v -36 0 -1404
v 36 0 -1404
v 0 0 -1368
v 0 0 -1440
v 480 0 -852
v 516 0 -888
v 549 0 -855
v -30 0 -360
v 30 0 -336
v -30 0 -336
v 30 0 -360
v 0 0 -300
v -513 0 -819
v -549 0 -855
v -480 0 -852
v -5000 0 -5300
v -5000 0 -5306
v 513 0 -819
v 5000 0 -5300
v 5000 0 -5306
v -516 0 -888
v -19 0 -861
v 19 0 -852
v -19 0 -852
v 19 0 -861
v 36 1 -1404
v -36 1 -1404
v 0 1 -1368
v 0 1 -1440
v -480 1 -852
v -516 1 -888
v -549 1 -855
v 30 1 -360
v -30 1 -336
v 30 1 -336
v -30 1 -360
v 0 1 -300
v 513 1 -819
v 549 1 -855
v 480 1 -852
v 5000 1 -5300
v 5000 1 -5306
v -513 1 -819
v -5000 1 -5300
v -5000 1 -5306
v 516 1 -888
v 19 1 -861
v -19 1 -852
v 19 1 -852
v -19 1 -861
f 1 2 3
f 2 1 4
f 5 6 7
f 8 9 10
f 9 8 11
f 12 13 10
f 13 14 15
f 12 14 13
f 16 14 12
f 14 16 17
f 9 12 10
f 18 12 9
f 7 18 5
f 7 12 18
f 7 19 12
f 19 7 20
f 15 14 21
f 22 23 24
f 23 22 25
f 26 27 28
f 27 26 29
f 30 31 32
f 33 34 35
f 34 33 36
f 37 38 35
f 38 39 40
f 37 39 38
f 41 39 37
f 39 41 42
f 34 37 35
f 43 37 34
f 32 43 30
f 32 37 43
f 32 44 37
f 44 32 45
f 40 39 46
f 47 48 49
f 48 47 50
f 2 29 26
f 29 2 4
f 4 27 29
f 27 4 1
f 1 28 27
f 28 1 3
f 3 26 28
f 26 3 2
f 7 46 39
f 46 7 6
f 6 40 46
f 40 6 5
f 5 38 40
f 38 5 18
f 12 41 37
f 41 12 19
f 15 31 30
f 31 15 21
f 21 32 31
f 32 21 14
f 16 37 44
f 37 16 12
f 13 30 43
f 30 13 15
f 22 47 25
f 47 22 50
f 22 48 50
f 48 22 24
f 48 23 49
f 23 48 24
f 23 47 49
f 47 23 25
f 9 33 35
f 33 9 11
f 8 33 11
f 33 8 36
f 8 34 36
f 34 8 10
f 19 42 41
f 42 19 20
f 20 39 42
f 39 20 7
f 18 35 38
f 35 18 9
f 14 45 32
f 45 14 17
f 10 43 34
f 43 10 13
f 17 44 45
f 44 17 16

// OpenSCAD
$fs = 120;

$vpt = [0,1080,480];
$vpr = [-34,0,0];
$vpf = 45;

foul_line = 6;
plain_color = [1,1,1,0.8];
out_color = [1,0.75,0.75,0.8];
eat_color = [0.5,0.75,1,0.8];

// home, first, second, third, rubber
color([1,1,1]) scale([1,-1,-1]) rotate([90,0,0]) linear_extrude(1) {
    polygon([[-30,30*2+300],[30,30*2+300],[30,30+300],[0,300],[-30,30+300]]);
    polygon([[552-36*2,852],[552-36,852+36],[552,852],[552-36,852-36]]);
    polygon([[0,1404+36],[36,1404],[0,1404-36],[-36,1404]]);
    polygon([[-552+36*2,852],[-552+36,852+36],[-552,852],[-552+36,852-36]]);
    polygon([[-19,852],[19,852],[19,9+852],[-19,9+852]]);
}

// foul lines
color([1,1,1,0.5]) scale([1,-1,-1]) rotate([90,0,0]) linear_extrude(1) {
    polygon([[0,300],[-5000,300+5000],[-5000,300+5000+foul_line],[0,300+foul_line]]);
    polygon([[0,300],[5000,300+5000],[5000,300+5000+foul_line],[0,300+foul_line]]);
}

scale([0.1,0.1,-0.1]) translate([-23200,0,0]) {
    color(out_color) polyhedron([[9680,0,11550],[14460,0,5630],[9680,3350,11550],[14460,3350,5630]], [[0,1,3,2]]);
    color(out_color) polyhedron([[9680,0,11550],[12300,0,13130],[9680,3350,11550],[12300,3350,13130]], [[0,1,3,2]]);
    color(out_color) polyhedron([[14460,0,5630],[16080,0,7210],[14460,3350,5630],[16080,3350,7210]], [[0,1,3,2]]);
    color(out_color) polyhedron([[12300,0,13130],[16080,0,7210],[12300,3350,13130],[16080,3350,7210]], [[0,1,3,2]]);
    color(out_color) polyhedron([[9680,3350,11550],[12300,3350,13130],[14460,3350,5630],[16080,3350,7210]], [[0,1,3,2]]);
    color(plain_color) polyhedron([[13860,0,10650],[14060,0,10650],[13860,10000,10650],[14060,10000,10650]], [[0,1,3,2]]);
    color(plain_color) polyhedron([[13860,0,10650],[13860,0,10950],[13860,10000,10650],[13860,10000,10950]], [[0,1,3,2]]);
    color(plain_color) polyhedron([[14060,0,10650],[14060,0,10950],[14060,10000,10650],[14060,10000,10950]], [[0,1,3,2]]);
    color(plain_color) polyhedron([[13860,0,10950],[14060,0,10950],[13860,10000,10950],[14060,10000,10950]], [[0,1,3,2]]);
    color(plain_color) polyhedron([[13860,10000,10650],[13860,10000,10950],[14060,10000,10650],[14060,10000,10950]], [[0,1,3,2]]);
    color(out_color) polyhedron([[3000,0,34530],[12320,0,24820],[3000,20000,34530],[12320,20000,24820]], [[0,1,3,2]]);
    color(out_color) polyhedron([[3000,0,34530],[3000,0,35530],[3000,20000,34530],[3000,20000,35530]], [[0,1,3,2]]);
    color(out_color) polyhedron([[12320,0,24820],[12320,0,25820],[12320,20000,24820],[12320,20000,25820]], [[0,1,3,2]]);
    color(out_color) polyhedron([[3000,0,35530],[12320,0,25820],[3000,20000,35530],[12320,20000,25820]], [[0,1,3,2]]);
    color(out_color) polyhedron([[3000,20000,34530],[3000,20000,35530],[12320,20000,24820],[12320,20000,25820]], [[0,1,3,2]]);
    color(out_color) polyhedron([[12320,0,24820],[29040,0,41680],[12320,20000,24820],[29040,20000,41680]], [[0,1,3,2]]);
    color(out_color) polyhedron([[12320,0,24820],[11320,0,25860],[12320,20000,24820],[11320,20000,25860]], [[0,1,3,2]]);
    color(out_color) polyhedron([[29040,0,41680],[28040,0,42720],[29040,20000,41680],[28040,20000,42720]], [[0,1,3,2]]);
    color(out_color) polyhedron([[11320,0,25860],[28040,0,42720],[11320,20000,25860],[28040,20000,42720]], [[0,1,3,2]]);
    color(out_color) polyhedron([[12320,20000,24820],[11320,20000,25860],[29040,20000,41680],[28040,20000,42720]], [[0,1,3,2]]);
    color(out_color) polyhedron([[18880,0,34890],[26580,0,27020],[18880,1700,34890],[26580,1700,27020]], [[0,1,3,2]]);
    color(out_color) polyhedron([[18880,0,34890],[18880,0,34990],[18880,1700,34890],[18880,1700,34990]], [[0,1,3,2]]);
    color(out_color) polyhedron([[26580,0,27020],[26580,0,27120],[26580,1700,27020],[26580,1700,27120]], [[0,1,3,2]]);
    color(out_color) polyhedron([[18880,0,34990],[26580,0,27120],[18880,1700,34990],[26580,1700,27120]], [[0,1,3,2]]);
    color(out_color) polyhedron([[18880,1700,34890],[18880,1700,34990],[26580,1700,27020],[26580,1700,27120]], [[0,1,3,2]]);
    color(out_color) polyhedron([[26580,0,27020],[40000,0,14295],[26580,20000,27020],[40000,20000,14295]], [[0,1,3,2]]);
    color(out_color) polyhedron([[26580,0,27020],[26580,0,27120],[26580,20000,27020],[26580,20000,27120]], [[0,1,3,2]]);
    color(out_color) polyhedron([[40000,0,14295],[40000,0,14340],[40000,20000,14295],[40000,20000,14340]], [[0,1,3,2]]);
    color(out_color) polyhedron([[26580,0,27120],[40000,0,14340],[26580,20000,27120],[40000,20000,14340]], [[0,1,3,2]]);
    color(out_color) polyhedron([[26580,20000,27020],[26580,20000,27120],[40000,20000,14295],[40000,20000,14340]], [[0,1,3,2]]);
    color(plain_color) polyhedron([[17530,0,27150],[22660,0,32554],[17530,1300,27150],[22660,1300,32554]], [[0,1,3,2]]);
    color(plain_color) polyhedron([[17530,0,27150],[16200,0,28732],[17530,1300,27150],[16200,1600,28732]], [[0,1,3,2]]);
    color(plain_color) polyhedron([[22660,0,32554],[21000,0,34159],[22660,1300,32554],[21000,1600,34159]], [[0,1,3,2]]);
    color(plain_color) polyhedron([[16200,0,28732],[21000,0,34159],[16200,1600,28732],[21000,1600,34159]], [[0,1,3,2]]);
    color(plain_color) polyhedron([[17530,1300,27150],[16200,1600,28732],[22660,1300,32554],[21000,1600,34159]], [[0,1,3,2]]);
    color(plain_color) polyhedron([[13770,0,5030],[14460,0,5630],[13770,5,5030],[14460,5,5630]], [[0,1,3,2]]);
    color(plain_color) polyhedron([[13770,0,5030],[13670,0,5030],[13770,5,5030],[13670,5,5030]], [[0,1,3,2]]);
    color(plain_color) polyhedron([[14460,0,5630],[14360,0,5630],[14460,5,5630],[14360,5,5630]], [[0,1,3,2]]);
    color(plain_color) polyhedron([[13670,0,5030],[14360,0,5630],[13670,5,5030],[14360,5,5630]], [[0,1,3,2]]);
    color(plain_color) polyhedron([[13770,5,5030],[13670,5,5030],[14460,5,5630],[14360,5,5630]], [[0,1,3,2]]);
    color(out_color) polyhedron([[13960,0,4590],[18500,0,4590],[13960,5,4590],[18500,5,4590]], [[0,1,3,2]]);
    color(out_color) polyhedron([[13960,0,4590],[13960,0,4690],[13960,5,4590],[13960,5,4690]], [[0,1,3,2]]);
    color(out_color) polyhedron([[18500,0,4590],[18500,0,4690],[18500,5,4590],[18500,5,4690]], [[0,1,3,2]]);
    color(out_color) polyhedron([[13960,0,4690],[18500,0,4690],[13960,5,4690],[18500,5,4690]], [[0,1,3,2]]);
    color(out_color) polyhedron([[13960,5,4590],[13960,5,4690],[18500,5,4590],[18500,5,4690]], [[0,1,3,2]]);
    color(out_color) polyhedron([[19090,0,1880],[19190,0,1880],[19090,5,1880],[19190,5,1880]], [[0,1,3,2]]);
    color(out_color) polyhedron([[19090,0,1880],[18500,0,4560],[19090,5,1880],[18500,5,4560]], [[0,1,3,2]]);
    color(out_color) polyhedron([[19190,0,1880],[18600,0,4560],[19190,5,1880],[18600,5,4560]], [[0,1,3,2]]);
    color(out_color) polyhedron([[18500,0,4560],[18600,0,4560],[18500,5,4560],[18600,5,4560]], [[0,1,3,2]]);
    color(out_color) polyhedron([[19090,5,1880],[18500,5,4560],[19190,5,1880],[18600,5,4560]], [[0,1,3,2]]);
    color(out_color) polyhedron([[9540,0,16630],[9550,0,16630],[9540,5,16630],[9550,5,16630]], [[0,1,3,2]]);
    color(out_color) polyhedron([[9540,0,16630],[2670,0,35450],[9540,5,16630],[2670,5,35450]], [[0,1,3,2]]);
    color(out_color) polyhedron([[9550,0,16630],[2670,0,35460],[9550,5,16630],[2670,5,35460]], [[0,1,3,2]]);
    color(out_color) polyhedron([[2670,0,35450],[2670,0,35460],[2670,5,35450],[2670,5,35460]], [[0,1,3,2]]);
    color(out_color) polyhedron([[9540,5,16630],[2670,5,35450],[9550,5,16630],[2670,5,35460]], [[0,1,3,2]]);
    color(plain_color) polyhedron([[0,0,0],[0,0,0],[0,0,0],[0,0,0]], [[0,1,3,2]]);
    color(plain_color) polyhedron([[0,0,0],[0,0,0],[0,0,0],[0,0,0]], [[0,1,3,2]]);
    color(plain_color) polyhedron([[0,0,0],[0,0,0],[0,0,0],[0,0,0]], [[0,1,3,2]]);
    color(plain_color) polyhedron([[0,0,0],[0,0,0],[0,0,0],[0,0,0]], [[0,1,3,2]]);
    color(plain_color) polyhedron([[0,0,0],[0,0,0],[0,0,0],[0,0,0]], [[0,1,3,2]]);
    color(plain_color) polyhedron([[0,0,0],[0,0,0],[0,0,0],[0,0,0]], [[0,1,3,2]]);
    color(plain_color) polyhedron([[0,0,0],[0,0,0],[0,0,0],[0,0,0]], [[0,1,3,2]]);
    color(plain_color) polyhedron([[0,0,0],[0,0,0],[0,0,0],[0,0,0]], [[0,1,3,2]]);
    color(plain_color) polyhedron([[0,0,0],[0,0,0],[0,0,0],[0,0,0]], [[0,1,3,2]]);
    color(plain_color) polyhedron([[0,0,0],[0,0,0],[0,0,0],[0,0,0]], [[0,1,3,2]]);
    color(plain_color) polyhedron([[0,0,0],[0,0,0],[0,0,0],[0,0,0]], [[0,1,3,2]]);
    color(plain_color) polyhedron([[0,0,0],[0,0,0],[0,0,0],[0,0,0]], [[0,1,3,2]]);
    color(plain_color) polyhedron([[0,0,0],[0,0,0],[0,0,0],[0,0,0]], [[0,1,3,2]]);
    color(plain_color) polyhedron([[0,0,0],[0,0,0],[0,0,0],[0,0,0]], [[0,1,3,2]]);
    color(plain_color) polyhedron([[0,0,0],[0,0,0],[0,0,0],[0,0,0]], [[0,1,3,2]]);
    color(plain_color) polyhedron([[0,0,0],[0,0,0],[0,0,0],[0,0,0]], [[0,1,3,2]]);
    color(plain_color) polyhedron([[0,0,0],[0,0,0],[0,0,0],[0,0,0]], [[0,1,3,2]]);
    color(plain_color) polyhedron([[0,0,0],[0,0,0],[0,0,0],[0,0,0]], [[0,1,3,2]]);
    color(plain_color) polyhedron([[0,0,0],[0,0,0],[0,0,0],[0,0,0]], [[0,1,3,2]]);
    color(plain_color) polyhedron([[0,0,0],[0,0,0],[0,0,0],[0,0,0]], [[0,1,3,2]]);
    color(plain_color) polyhedron([[0,0,0],[0,0,0],[0,0,0],[0,0,0]], [[0,1,3,2]]);
    color(plain_color) polyhedron([[0,0,0],[0,0,0],[0,0,0],[0,0,0]], [[0,1,3,2]]);
    color(plain_color) polyhedron([[0,0,0],[0,0,0],[0,0,0],[0,0,0]], [[0,1,3,2]]);
    color(plain_color) polyhedron([[0,0,0],[0,0,0],[0,0,0],[0,0,0]], [[0,1,3,2]]);
    color(plain_color) polyhedron([[0,0,0],[0,0,0],[0,0,0],[0,0,0]], [[0,1,3,2]]);
    color(plain_color) polyhedron([[0,0,0],[0,0,0],[0,0,0],[0,0,0]], [[0,1,3,2]]);
    color(plain_color) polyhedron([[0,0,0],[0,0,0],[0,0,0],[0,0,0]], [[0,1,3,2]]);
    color(plain_color) polyhedron([[0,0,0],[0,0,0],[0,0,0],[0,0,0]], [[0,1,3,2]]);
    color(plain_color) polyhedron([[0,0,0],[0,0,0],[0,0,0],[0,0,0]], [[0,1,3,2]]);
    color(plain_color) polyhedron([[0,0,0],[0,0,0],[0,0,0],[0,0,0]], [[0,1,3,2]]);
    color(plain_color) polyhedron([[0,0,0],[0,0,0],[0,0,0],[0,0,0]], [[0,1,3,2]]);
    color(plain_color) polyhedron([[0,0,0],[0,0,0],[0,0,0],[0,0,0]], [[0,1,3,2]]);
    color(plain_color) polyhedron([[0,0,0],[0,0,0],[0,0,0],[0,0,0]], [[0,1,3,2]]);
    color(plain_color) polyhedron([[0,0,0],[0,0,0],[0,0,0],[0,0,0]], [[0,1,3,2]]);
    color(plain_color) polyhedron([[0,0,0],[0,0,0],[0,0,0],[0,0,0]], [[0,1,3,2]]);
    color(plain_color) polyhedron([[0,0,0],[0,0,0],[0,0,0],[0,0,0]], [[0,1,3,2]]);
    color(plain_color) polyhedron([[0,0,0],[0,0,0],[0,0,0],[0,0,0]], [[0,1,3,2]]);
    color(plain_color) polyhedron([[0,0,0],[0,0,0],[0,0,0],[0,0,0]], [[0,1,3,2]]);
    color(plain_color) polyhedron([[0,0,0],[0,0,0],[0,0,0],[0,0,0]], [[0,1,3,2]]);
    color(plain_color) polyhedron([[0,0,0],[0,0,0],[0,0,0],[0,0,0]], [[0,1,3,2]]);
    color(plain_color) polyhedron([[0,0,0],[0,0,0],[0,0,0],[0,0,0]], [[0,1,3,2]]);
    color(plain_color) polyhedron([[0,0,0],[0,0,0],[0,0,0],[0,0,0]], [[0,1,3,2]]);
    color(plain_color) polyhedron([[0,0,0],[0,0,0],[0,0,0],[0,0,0]], [[0,1,3,2]]);
    color(plain_color) polyhedron([[0,0,0],[0,0,0],[0,0,0],[0,0,0]], [[0,1,3,2]]);
    color(plain_color) polyhedron([[0,0,0],[0,0,0],[0,0,0],[0,0,0]], [[0,1,3,2]]);
    color(plain_color) polyhedron([[0,0,0],[0,0,0],[0,0,0],[0,0,0]], [[0,1,3,2]]);
    color(plain_color) polyhedron([[0,0,0],[0,0,0],[0,0,0],[0,0,0]], [[0,1,3,2]]);
    color(plain_color) polyhedron([[0,0,0],[0,0,0],[0,0,0],[0,0,0]], [[0,1,3,2]]);
    color(plain_color) polyhedron([[0,0,0],[0,0,0],[0,0,0],[0,0,0]], [[0,1,3,2]]);
    color(plain_color) polyhedron([[0,0,0],[0,0,0],[0,0,0],[0,0,0]], [[0,1,3,2]]);
    color(plain_color) polyhedron([[0,0,0],[0,0,0],[0,0,0],[0,0,0]], [[0,1,3,2]]);
    color(plain_color) polyhedron([[0,0,0],[0,0,0],[0,0,0],[0,0,0]], [[0,1,3,2]]);
    color(plain_color) polyhedron([[0,0,0],[0,0,0],[0,0,0],[0,0,0]], [[0,1,3,2]]);
    color(plain_color) polyhedron([[0,0,0],[0,0,0],[0,0,0],[0,0,0]], [[0,1,3,2]]);
    color(plain_color) polyhedron([[0,0,0],[0,0,0],[0,0,0],[0,0,0]], [[0,1,3,2]]);
    color(plain_color) polyhedron([[0,0,0],[0,0,0],[0,0,0],[0,0,0]], [[0,1,3,2]]);
    color(plain_color) polyhedron([[0,0,0],[0,0,0],[0,0,0],[0,0,0]], [[0,1,3,2]]);
    color(plain_color) polyhedron([[0,0,0],[0,0,0],[0,0,0],[0,0,0]], [[0,1,3,2]]);
    color(plain_color) polyhedron([[0,0,0],[0,0,0],[0,0,0],[0,0,0]], [[0,1,3,2]]);
    color(plain_color) polyhedron([[0,0,0],[0,0,0],[0,0,0],[0,0,0]], [[0,1,3,2]]);
    color(plain_color) polyhedron([[0,0,0],[0,0,0],[0,0,0],[0,0,0]], [[0,1,3,2]]);
    color(plain_color) polyhedron([[0,0,0],[0,0,0],[0,0,0],[0,0,0]], [[0,1,3,2]]);
    color(plain_color) polyhedron([[0,0,0],[0,0,0],[0,0,0],[0,0,0]], [[0,1,3,2]]);
    color(plain_color) polyhedron([[0,0,0],[0,0,0],[0,0,0],[0,0,0]], [[0,1,3,2]]);
    color(plain_color) polyhedron([[0,0,0],[0,0,0],[0,0,0],[0,0,0]], [[0,1,3,2]]);
    color(plain_color) polyhedron([[0,0,0],[0,0,0],[0,0,0],[0,0,0]], [[0,1,3,2]]);
    color(plain_color) polyhedron([[0,0,0],[0,0,0],[0,0,0],[0,0,0]], [[0,1,3,2]]);
    color(plain_color) polyhedron([[0,0,0],[0,0,0],[0,0,0],[0,0,0]], [[0,1,3,2]]);
    color(plain_color) polyhedron([[0,0,0],[0,0,0],[0,0,0],[0,0,0]], [[0,1,3,2]]);
    color(plain_color) polyhedron([[0,0,0],[0,0,0],[0,0,0],[0,0,0]], [[0,1,3,2]]);
    color(plain_color) polyhedron([[0,0,0],[0,0,0],[0,0,0],[0,0,0]], [[0,1,3,2]]);
    color(plain_color) polyhedron([[0,0,0],[0,0,0],[0,0,0],[0,0,0]], [[0,1,3,2]]);
    color(plain_color) polyhedron([[0,0,0],[0,0,0],[0,0,0],[0,0,0]], [[0,1,3,2]]);
    color(plain_color) polyhedron([[0,0,0],[0,0,0],[0,0,0],[0,0,0]], [[0,1,3,2]]);
    color(plain_color) polyhedron([[0,0,0],[0,0,0],[0,0,0],[0,0,0]], [[0,1,3,2]]);
    color(plain_color) polyhedron([[0,0,0],[0,0,0],[0,0,0],[0,0,0]], [[0,1,3,2]]);
    color(plain_color) polyhedron([[0,0,0],[0,0,0],[0,0,0],[0,0,0]], [[0,1,3,2]]);
    color(plain_color) polyhedron([[0,0,0],[0,0,0],[0,0,0],[0,0,0]], [[0,1,3,2]]);
    color(plain_color) polyhedron([[0,0,0],[0,0,0],[0,0,0],[0,0,0]], [[0,1,3,2]]);
    color(plain_color) polyhedron([[0,0,0],[0,0,0],[0,0,0],[0,0,0]], [[0,1,3,2]]);
    color(plain_color) polyhedron([[0,0,0],[0,0,0],[0,0,0],[0,0,0]], [[0,1,3,2]]);
    color(plain_color) polyhedron([[0,0,0],[0,0,0],[0,0,0],[0,0,0]], [[0,1,3,2]]);
    color(plain_color) polyhedron([[0,0,0],[0,0,0],[0,0,0],[0,0,0]], [[0,1,3,2]]);
    color(plain_color) polyhedron([[0,0,0],[0,0,0],[0,0,0],[0,0,0]], [[0,1,3,2]]);
    color(plain_color) polyhedron([[0,0,0],[0,0,0],[0,0,0],[0,0,0]], [[0,1,3,2]]);
    color(plain_color) polyhedron([[0,0,0],[0,0,0],[0,0,0],[0,0,0]], [[0,1,3,2]]);
    color(plain_color) polyhedron([[0,0,0],[0,0,0],[0,0,0],[0,0,0]], [[0,1,3,2]]);
    color(plain_color) polyhedron([[0,0,0],[0,0,0],[0,0,0],[0,0,0]], [[0,1,3,2]]);
    color(plain_color) polyhedron([[0,0,0],[0,0,0],[0,0,0],[0,0,0]], [[0,1,3,2]]);
    color(plain_color) polyhedron([[0,0,0],[0,0,0],[0,0,0],[0,0,0]], [[0,1,3,2]]);
    color(plain_color) polyhedron([[0,0,0],[0,0,0],[0,0,0],[0,0,0]], [[0,1,3,2]]);
    color(plain_color) polyhedron([[0,0,0],[0,0,0],[0,0,0],[0,0,0]], [[0,1,3,2]]);
    color(plain_color) polyhedron([[0,0,0],[0,0,0],[0,0,0],[0,0,0]], [[0,1,3,2]]);
    color(plain_color) polyhedron([[0,0,0],[0,0,0],[0,0,0],[0,0,0]], [[0,1,3,2]]);
    color(plain_color) polyhedron([[0,0,0],[0,0,0],[0,0,0],[0,0,0]], [[0,1,3,2]]);
    color(plain_color) polyhedron([[0,0,0],[0,0,0],[0,0,0],[0,0,0]], [[0,1,3,2]]);
    color(plain_color) polyhedron([[0,0,0],[0,0,0],[0,0,0],[0,0,0]], [[0,1,3,2]]);
    color(plain_color) polyhedron([[0,0,0],[0,0,0],[0,0,0],[0,0,0]], [[0,1,3,2]]);
    color(plain_color) polyhedron([[0,0,0],[0,0,0],[0,0,0],[0,0,0]], [[0,1,3,2]]);
    color(plain_color) polyhedron([[0,0,0],[0,0,0],[0,0,0],[0,0,0]], [[0,1,3,2]]);
    color(plain_color) polyhedron([[0,0,0],[0,0,0],[0,0,0],[0,0,0]], [[0,1,3,2]]);
    color(plain_color) polyhedron([[0,0,0],[0,0,0],[0,0,0],[0,0,0]], [[0,1,3,2]]);
    color(plain_color) polyhedron([[0,0,0],[0,0,0],[0,0,0],[0,0,0]], [[0,1,3,2]]);
    color(plain_color) polyhedron([[0,0,0],[0,0,0],[0,0,0],[0,0,0]], [[0,1,3,2]]);
    color(plain_color) polyhedron([[0,0,0],[0,0,0],[0,0,0],[0,0,0]], [[0,1,3,2]]);
    color(plain_color) polyhedron([[0,0,0],[0,0,0],[0,0,0],[0,0,0]], [[0,1,3,2]]);
    color(plain_color) polyhedron([[0,0,0],[0,0,0],[0,0,0],[0,0,0]], [[0,1,3,2]]);
    color(plain_color) polyhedron([[0,0,0],[0,0,0],[0,0,0],[0,0,0]], [[0,1,3,2]]);
    color(plain_color) polyhedron([[0,0,0],[0,0,0],[0,0,0],[0,0,0]], [[0,1,3,2]]);
    color(plain_color) polyhedron([[0,0,0],[0,0,0],[0,0,0],[0,0,0]], [[0,1,3,2]]);
    color(plain_color) polyhedron([[0,0,0],[0,0,0],[0,0,0],[0,0,0]], [[0,1,3,2]]);
    color(plain_color) polyhedron([[0,0,0],[0,0,0],[0,0,0],[0,0,0]], [[0,1,3,2]]);
    color(plain_color) polyhedron([[0,0,0],[0,0,0],[0,0,0],[0,0,0]], [[0,1,3,2]]);
    color(plain_color) polyhedron([[0,0,0],[0,0,0],[0,0,0],[0,0,0]], [[0,1,3,2]]);
    color(plain_color) polyhedron([[0,0,0],[0,0,0],[0,0,0],[0,0,0]], [[0,1,3,2]]);
    color(plain_color) polyhedron([[0,0,0],[0,0,0],[0,0,0],[0,0,0]], [[0,1,3,2]]);
    color(plain_color) polyhedron([[0,0,0],[0,0,0],[0,0,0],[0,0,0]], [[0,1,3,2]]);
    color(plain_color) polyhedron([[0,0,0],[0,0,0],[0,0,0],[0,0,0]], [[0,1,3,2]]);
    color(plain_color) polyhedron([[0,0,0],[0,0,0],[0,0,0],[0,0,0]], [[0,1,3,2]]);
    color(plain_color) polyhedron([[0,0,0],[0,0,0],[0,0,0],[0,0,0]], [[0,1,3,2]]);
    color(plain_color) polyhedron([[0,0,0],[0,0,0],[0,0,0],[0,0,0]], [[0,1,3,2]]);
    color(plain_color) polyhedron([[0,0,0],[0,0,0],[0,0,0],[0,0,0]], [[0,1,3,2]]);
    color(plain_color) polyhedron([[0,0,0],[0,0,0],[0,0,0],[0,0,0]], [[0,1,3,2]]);
    color(plain_color) polyhedron([[0,0,0],[0,0,0],[0,0,0],[0,0,0]], [[0,1,3,2]]);
    color(plain_color) polyhedron([[0,0,0],[0,0,0],[0,0,0],[0,0,0]], [[0,1,3,2]]);
    color(plain_color) polyhedron([[0,0,0],[0,0,0],[0,0,0],[0,0,0]], [[0,1,3,2]]);
    color(plain_color) polyhedron([[0,0,0],[0,0,0],[0,0,0],[0,0,0]], [[0,1,3,2]]);
    color(plain_color) polyhedron([[0,0,0],[0,0,0],[0,0,0],[0,0,0]], [[0,1,3,2]]);
    color(plain_color) polyhedron([[0,0,0],[0,0,0],[0,0,0],[0,0,0]], [[0,1,3,2]]);
    color(plain_color) polyhedron([[0,0,0],[0,0,0],[0,0,0],[0,0,0]], [[0,1,3,2]]);
    color(plain_color) polyhedron([[0,0,0],[0,0,0],[0,0,0],[0,0,0]], [[0,1,3,2]]);
    color(plain_color) polyhedron([[0,0,0],[0,0,0],[0,0,0],[0,0,0]], [[0,1,3,2]]);
    color(plain_color) polyhedron([[0,0,0],[0,0,0],[0,0,0],[0,0,0]], [[0,1,3,2]]);
    color(plain_color) polyhedron([[0,0,0],[0,0,0],[0,0,0],[0,0,0]], [[0,1,3,2]]);
    color(plain_color) polyhedron([[0,0,0],[0,0,0],[0,0,0],[0,0,0]], [[0,1,3,2]]);
    color(plain_color) polyhedron([[0,0,0],[0,0,0],[0,0,0],[0,0,0]], [[0,1,3,2]]);
    color(plain_color) polyhedron([[0,0,0],[0,0,0],[0,0,0],[0,0,0]], [[0,1,3,2]]);
    color(plain_color) polyhedron([[0,0,0],[0,0,0],[0,0,0],[0,0,0]], [[0,1,3,2]]);
    color(plain_color) polyhedron([[0,0,0],[0,0,0],[0,0,0],[0,0,0]], [[0,1,3,2]]);
    color(plain_color) polyhedron([[0,0,0],[0,0,0],[0,0,0],[0,0,0]], [[0,1,3,2]]);
    color(plain_color) polyhedron([[0,0,0],[0,0,0],[0,0,0],[0,0,0]], [[0,1,3,2]]);
    color(plain_color) polyhedron([[0,0,0],[0,0,0],[0,0,0],[0,0,0]], [[0,1,3,2]]);
    color(plain_color) polyhedron([[0,0,0],[0,0,0],[0,0,0],[0,0,0]], [[0,1,3,2]]);
    color(plain_color) polyhedron([[0,0,0],[0,0,0],[0,0,0],[0,0,0]], [[0,1,3,2]]);
    color(plain_color) polyhedron([[0,0,0],[0,0,0],[0,0,0],[0,0,0]], [[0,1,3,2]]);
    color(plain_color) polyhedron([[0,0,0],[0,0,0],[0,0,0],[0,0,0]], [[0,1,3,2]]);
    color(plain_color) polyhedron([[0,0,0],[0,0,0],[0,0,0],[0,0,0]], [[0,1,3,2]]);
    color(plain_color) polyhedron([[0,0,0],[0,0,0],[0,0,0],[0,0,0]], [[0,1,3,2]]);
    color(plain_color) polyhedron([[0,0,0],[0,0,0],[0,0,0],[0,0,0]], [[0,1,3,2]]);
    color(plain_color) polyhedron([[0,0,0],[0,0,0],[0,0,0],[0,0,0]], [[0,1,3,2]]);
    color(plain_color) polyhedron([[0,0,0],[0,0,0],[0,0,0],[0,0,0]], [[0,1,3,2]]);
    color(plain_color) polyhedron([[0,0,0],[0,0,0],[0,0,0],[0,0,0]], [[0,1,3,2]]);
    color(plain_color) polyhedron([[0,0,0],[0,0,0],[0,0,0],[0,0,0]], [[0,1,3,2]]);
    color(plain_color) polyhedron([[0,0,0],[0,0,0],[0,0,0],[0,0,0]], [[0,1,3,2]]);
    color(plain_color) polyhedron([[0,0,0],[0,0,0],[0,0,0],[0,0,0]], [[0,1,3,2]]);
    color(plain_color) polyhedron([[0,0,0],[0,0,0],[0,0,0],[0,0,0]], [[0,1,3,2]]);
    color(plain_color) polyhedron([[0,0,0],[0,0,0],[0,0,0],[0,0,0]], [[0,1,3,2]]);
    color(plain_color) polyhedron([[0,0,0],[0,0,0],[0,0,0],[0,0,0]], [[0,1,3,2]]);
    color(plain_color) polyhedron([[0,0,0],[0,0,0],[0,0,0],[0,0,0]], [[0,1,3,2]]);
    color(plain_color) polyhedron([[0,0,0],[0,0,0],[0,0,0],[0,0,0]], [[0,1,3,2]]);
    color(plain_color) polyhedron([[0,0,0],[0,0,0],[0,0,0],[0,0,0]], [[0,1,3,2]]);
    color(plain_color) polyhedron([[0,0,0],[0,0,0],[0,0,0],[0,0,0]], [[0,1,3,2]]);
    color(plain_color) polyhedron([[0,0,0],[0,0,0],[0,0,0],[0,0,0]], [[0,1,3,2]]);
    color(plain_color) polyhedron([[0,0,0],[0,0,0],[0,0,0],[0,0,0]], [[0,1,3,2]]);
    color(plain_color) polyhedron([[0,0,0],[0,0,0],[0,0,0],[0,0,0]], [[0,1,3,2]]);
    color(plain_color) polyhedron([[0,0,0],[0,0,0],[0,0,0],[0,0,0]], [[0,1,3,2]]);
    color(plain_color) polyhedron([[0,0,0],[0,0,0],[0,0,0],[0,0,0]], [[0,1,3,2]]);
    color(plain_color) polyhedron([[0,0,0],[0,0,0],[0,0,0],[0,0,0]], [[0,1,3,2]]);
    color(plain_color) polyhedron([[0,0,0],[0,0,0],[0,0,0],[0,0,0]], [[0,1,3,2]]);
    color(plain_color) polyhedron([[0,0,0],[0,0,0],[0,0,0],[0,0,0]], [[0,1,3,2]]);
    color(plain_color) polyhedron([[0,0,0],[0,0,0],[0,0,0],[0,0,0]], [[0,1,3,2]]);
    color(plain_color) polyhedron([[0,0,0],[0,0,0],[0,0,0],[0,0,0]], [[0,1,3,2]]);
    color(plain_color) polyhedron([[0,0,0],[0,0,0],[0,0,0],[0,0,0]], [[0,1,3,2]]);
    color(plain_color) polyhedron([[0,0,0],[0,0,0],[0,0,0],[0,0,0]], [[0,1,3,2]]);
    color(plain_color) polyhedron([[0,0,0],[0,0,0],[0,0,0],[0,0,0]], [[0,1,3,2]]);
    color(plain_color) polyhedron([[0,0,0],[0,0,0],[0,0,0],[0,0,0]], [[0,1,3,2]]);
    color(plain_color) polyhedron([[0,0,0],[0,0,0],[0,0,0],[0,0,0]], [[0,1,3,2]]);
    color(plain_color) polyhedron([[0,0,0],[0,0,0],[0,0,0],[0,0,0]], [[0,1,3,2]]);
    color(plain_color) polyhedron([[0,0,0],[0,0,0],[0,0,0],[0,0,0]], [[0,1,3,2]]);
    color(plain_color) polyhedron([[0,0,0],[0,0,0],[0,0,0],[0,0,0]], [[0,1,3,2]]);
    color(plain_color) polyhedron([[0,0,0],[0,0,0],[0,0,0],[0,0,0]], [[0,1,3,2]]);
    color(plain_color) polyhedron([[0,0,0],[0,0,0],[0,0,0],[0,0,0]], [[0,1,3,2]]);
    color(plain_color) polyhedron([[0,0,0],[0,0,0],[0,0,0],[0,0,0]], [[0,1,3,2]]);
    color(plain_color) polyhedron([[0,0,0],[0,0,0],[0,0,0],[0,0,0]], [[0,1,3,2]]);
    color(plain_color) polyhedron([[0,0,0],[0,0,0],[0,0,0],[0,0,0]], [[0,1,3,2]]);
    color(plain_color) polyhedron([[0,0,0],[0,0,0],[0,0,0],[0,0,0]], [[0,1,3,2]]);
    color(plain_color) polyhedron([[0,0,0],[0,0,0],[0,0,0],[0,0,0]], [[0,1,3,2]]);
    color(plain_color) polyhedron([[0,0,0],[0,0,0],[0,0,0],[0,0,0]], [[0,1,3,2]]);
    color(plain_color) polyhedron([[0,0,0],[0,0,0],[0,0,0],[0,0,0]], [[0,1,3,2]]);
    color(plain_color) polyhedron([[0,0,0],[0,0,0],[0,0,0],[0,0,0]], [[0,1,3,2]]);
    color(plain_color) polyhedron([[0,0,0],[0,0,0],[0,0,0],[0,0,0]], [[0,1,3,2]]);
    color(plain_color) polyhedron([[0,0,0],[0,0,0],[0,0,0],[0,0,0]], [[0,1,3,2]]);
    color(plain_color) polyhedron([[0,0,0],[0,0,0],[0,0,0],[0,0,0]], [[0,1,3,2]]);
    color(plain_color) polyhedron([[0,0,0],[0,0,0],[0,0,0],[0,0,0]], [[0,1,3,2]]);
    color(plain_color) polyhedron([[0,0,0],[0,0,0],[0,0,0],[0,0,0]], [[0,1,3,2]]);
    color(plain_color) polyhedron([[0,0,0],[0,0,0],[0,0,0],[0,0,0]], [[0,1,3,2]]);
    color(plain_color) polyhedron([[0,0,0],[0,0,0],[0,0,0],[0,0,0]], [[0,1,3,2]]);
    color(plain_color) polyhedron([[0,0,0],[0,0,0],[0,0,0],[0,0,0]], [[0,1,3,2]]);
    color(plain_color) polyhedron([[0,0,0],[0,0,0],[0,0,0],[0,0,0]], [[0,1,3,2]]);
    color(plain_color) polyhedron([[0,0,0],[0,0,0],[0,0,0],[0,0,0]], [[0,1,3,2]]);
    color(plain_color) polyhedron([[0,0,0],[0,0,0],[0,0,0],[0,0,0]], [[0,1,3,2]]);
    color(plain_color) polyhedron([[0,0,0],[0,0,0],[0,0,0],[0,0,0]], [[0,1,3,2]]);
    color(plain_color) polyhedron([[0,0,0],[0,0,0],[0,0,0],[0,0,0]], [[0,1,3,2]]);
    color(plain_color) polyhedron([[0,0,0],[0,0,0],[0,0,0],[0,0,0]], [[0,1,3,2]]);
    color(plain_color) polyhedron([[0,0,0],[0,0,0],[0,0,0],[0,0,0]], [[0,1,3,2]]);
    color(plain_color) polyhedron([[0,0,0],[0,0,0],[0,0,0],[0,0,0]], [[0,1,3,2]]);
    color(plain_color) polyhedron([[0,0,0],[0,0,0],[0,0,0],[0,0,0]], [[0,1,3,2]]);
    color(plain_color) polyhedron([[0,0,0],[0,0,0],[0,0,0],[0,0,0]], [[0,1,3,2]]);
    color(plain_color) polyhedron([[0,0,0],[0,0,0],[0,0,0],[0,0,0]], [[0,1,3,2]]);
    color(plain_color) polyhedron([[0,0,0],[0,0,0],[0,0,0],[0,0,0]], [[0,1,3,2]]);
    color(plain_color) polyhedron([[0,0,0],[0,0,0],[0,0,0],[0,0,0]], [[0,1,3,2]]);
    color(plain_color) polyhedron([[0,0,0],[0,0,0],[0,0,0],[0,0,0]], [[0,1,3,2]]);
    color(plain_color) polyhedron([[0,0,0],[0,0,0],[0,0,0],[0,0,0]], [[0,1,3,2]]);
    color(plain_color) polyhedron([[0,0,0],[0,0,0],[0,0,0],[0,0,0]], [[0,1,3,2]]);
    color(plain_color) polyhedron([[0,0,0],[0,0,0],[0,0,0],[0,0,0]], [[0,1,3,2]]);
    color(plain_color) polyhedron([[0,0,0],[0,0,0],[0,0,0],[0,0,0]], [[0,1,3,2]]);
    color(plain_color) polyhedron([[0,0,0],[0,0,0],[0,0,0],[0,0,0]], [[0,1,3,2]]);
    color(plain_color) polyhedron([[0,0,0],[0,0,0],[0,0,0],[0,0,0]], [[0,1,3,2]]);
    color(plain_color) polyhedron([[0,0,0],[0,0,0],[0,0,0],[0,0,0]], [[0,1,3,2]]);
    color(plain_color) polyhedron([[0,0,0],[0,0,0],[0,0,0],[0,0,0]], [[0,1,3,2]]);
    color(plain_color) polyhedron([[0,0,0],[0,0,0],[0,0,0],[0,0,0]], [[0,1,3,2]]);
    color(plain_color) polyhedron([[0,0,0],[0,0,0],[0,0,0],[0,0,0]], [[0,1,3,2]]);
    color(plain_color) polyhedron([[0,0,0],[0,0,0],[0,0,0],[0,0,0]], [[0,1,3,2]]);
    color(plain_color) polyhedron([[0,0,0],[0,0,0],[0,0,0],[0,0,0]], [[0,1,3,2]]);
    color(plain_color) polyhedron([[0,0,0],[0,0,0],[0,0,0],[0,0,0]], [[0,1,3,2]]);
    color(plain_color) polyhedron([[0,0,0],[0,0,0],[0,0,0],[0,0,0]], [[0,1,3,2]]);
    color(plain_color) polyhedron([[0,0,0],[0,0,0],[0,0,0],[0,0,0]], [[0,1,3,2]]);
    color(plain_color) polyhedron([[0,0,0],[0,0,0],[0,0,0],[0,0,0]], [[0,1,3,2]]);
    color(plain_color) polyhedron([[0,0,0],[0,0,0],[0,0,0],[0,0,0]], [[0,1,3,2]]);
    color(plain_color) polyhedron([[0,0,0],[0,0,0],[0,0,0],[0,0,0]], [[0,1,3,2]]);
    color(plain_color) polyhedron([[0,0,0],[0,0,0],[0,0,0],[0,0,0]], [[0,1,3,2]]);
    color(plain_color) polyhedron([[0,0,0],[0,0,0],[0,0,0],[0,0,0]], [[0,1,3,2]]);
    color(plain_color) polyhedron([[0,0,0],[0,0,0],[0,0,0],[0,0,0]], [[0,1,3,2]]);
    color(plain_color) polyhedron([[0,0,0],[0,0,0],[0,0,0],[0,0,0]], [[0,1,3,2]]);
    color(plain_color) polyhedron([[0,0,0],[0,0,0],[0,0,0],[0,0,0]], [[0,1,3,2]]);
    color(plain_color) polyhedron([[0,0,0],[0,0,0],[0,0,0],[0,0,0]], [[0,1,3,2]]);
    color(plain_color) polyhedron([[0,0,0],[0,0,0],[0,0,0],[0,0,0]], [[0,1,3,2]]);
    color(plain_color) polyhedron([[0,0,0],[0,0,0],[0,0,0],[0,0,0]], [[0,1,3,2]]);
    color(plain_color) polyhedron([[0,0,0],[0,0,0],[0,0,0],[0,0,0]], [[0,1,3,2]]);
    color(plain_color) polyhedron([[0,0,0],[0,0,0],[0,0,0],[0,0,0]], [[0,1,3,2]]);
    color(plain_color) polyhedron([[0,0,0],[0,0,0],[0,0,0],[0,0,0]], [[0,1,3,2]]);
    color(plain_color) polyhedron([[0,0,0],[0,0,0],[0,0,0],[0,0,0]], [[0,1,3,2]]);
    color(plain_color) polyhedron([[0,0,0],[0,0,0],[0,0,0],[0,0,0]], [[0,1,3,2]]);
    color(plain_color) polyhedron([[0,0,0],[0,0,0],[0,0,0],[0,0,0]], [[0,1,3,2]]);
    color(plain_color) polyhedron([[0,0,0],[0,0,0],[0,0,0],[0,0,0]], [[0,1,3,2]]);
    color(plain_color) polyhedron([[0,0,0],[0,0,0],[0,0,0],[0,0,0]], [[0,1,3,2]]);
    color(plain_color) polyhedron([[0,0,0],[0,0,0],[0,0,0],[0,0,0]], [[0,1,3,2]]);
    color(plain_color) polyhedron([[0,0,0],[0,0,0],[0,0,0],[0,0,0]], [[0,1,3,2]]);
    color(plain_color) polyhedron([[0,0,0],[0,0,0],[0,0,0],[0,0,0]], [[0,1,3,2]]);
    color(plain_color) polyhedron([[0,0,0],[0,0,0],[0,0,0],[0,0,0]], [[0,1,3,2]]);
    color(plain_color) polyhedron([[0,0,0],[0,0,0],[0,0,0],[0,0,0]], [[0,1,3,2]]);
    color(plain_color) polyhedron([[0,0,0],[0,0,0],[0,0,0],[0,0,0]], [[0,1,3,2]]);
    color(plain_color) polyhedron([[0,0,0],[0,0,0],[0,0,0],[0,0,0]], [[0,1,3,2]]);
    color(plain_color) polyhedron([[0,0,0],[0,0,0],[0,0,0],[0,0,0]], [[0,1,3,2]]);
    color(plain_color) polyhedron([[0,0,0],[0,0,0],[0,0,0],[0,0,0]], [[0,1,3,2]]);
    color(plain_color) polyhedron([[0,0,0],[0,0,0],[0,0,0],[0,0,0]], [[0,1,3,2]]);
    color(plain_color) polyhedron([[0,0,0],[0,0,0],[0,0,0],[0,0,0]], [[0,1,3,2]]);
    color(plain_color) polyhedron([[0,0,0],[0,0,0],[0,0,0],[0,0,0]], [[0,1,3,2]]);
    color(plain_color) polyhedron([[0,0,0],[0,0,0],[0,0,0],[0,0,0]], [[0,1,3,2]]);
    color(plain_color) polyhedron([[0,0,0],[0,0,0],[0,0,0],[0,0,0]], [[0,1,3,2]]);
    color(plain_color) polyhedron([[0,0,0],[0,0,0],[0,0,0],[0,0,0]], [[0,1,3,2]]);
    color(plain_color) polyhedron([[0,0,0],[0,0,0],[0,0,0],[0,0,0]], [[0,1,3,2]]);
    color(plain_color) polyhedron([[0,0,0],[0,0,0],[0,0,0],[0,0,0]], [[0,1,3,2]]);
    color(plain_color) polyhedron([[0,0,0],[0,0,0],[0,0,0],[0,0,0]], [[0,1,3,2]]);
    color(plain_color) polyhedron([[0,0,0],[0,0,0],[0,0,0],[0,0,0]], [[0,1,3,2]]);
}
